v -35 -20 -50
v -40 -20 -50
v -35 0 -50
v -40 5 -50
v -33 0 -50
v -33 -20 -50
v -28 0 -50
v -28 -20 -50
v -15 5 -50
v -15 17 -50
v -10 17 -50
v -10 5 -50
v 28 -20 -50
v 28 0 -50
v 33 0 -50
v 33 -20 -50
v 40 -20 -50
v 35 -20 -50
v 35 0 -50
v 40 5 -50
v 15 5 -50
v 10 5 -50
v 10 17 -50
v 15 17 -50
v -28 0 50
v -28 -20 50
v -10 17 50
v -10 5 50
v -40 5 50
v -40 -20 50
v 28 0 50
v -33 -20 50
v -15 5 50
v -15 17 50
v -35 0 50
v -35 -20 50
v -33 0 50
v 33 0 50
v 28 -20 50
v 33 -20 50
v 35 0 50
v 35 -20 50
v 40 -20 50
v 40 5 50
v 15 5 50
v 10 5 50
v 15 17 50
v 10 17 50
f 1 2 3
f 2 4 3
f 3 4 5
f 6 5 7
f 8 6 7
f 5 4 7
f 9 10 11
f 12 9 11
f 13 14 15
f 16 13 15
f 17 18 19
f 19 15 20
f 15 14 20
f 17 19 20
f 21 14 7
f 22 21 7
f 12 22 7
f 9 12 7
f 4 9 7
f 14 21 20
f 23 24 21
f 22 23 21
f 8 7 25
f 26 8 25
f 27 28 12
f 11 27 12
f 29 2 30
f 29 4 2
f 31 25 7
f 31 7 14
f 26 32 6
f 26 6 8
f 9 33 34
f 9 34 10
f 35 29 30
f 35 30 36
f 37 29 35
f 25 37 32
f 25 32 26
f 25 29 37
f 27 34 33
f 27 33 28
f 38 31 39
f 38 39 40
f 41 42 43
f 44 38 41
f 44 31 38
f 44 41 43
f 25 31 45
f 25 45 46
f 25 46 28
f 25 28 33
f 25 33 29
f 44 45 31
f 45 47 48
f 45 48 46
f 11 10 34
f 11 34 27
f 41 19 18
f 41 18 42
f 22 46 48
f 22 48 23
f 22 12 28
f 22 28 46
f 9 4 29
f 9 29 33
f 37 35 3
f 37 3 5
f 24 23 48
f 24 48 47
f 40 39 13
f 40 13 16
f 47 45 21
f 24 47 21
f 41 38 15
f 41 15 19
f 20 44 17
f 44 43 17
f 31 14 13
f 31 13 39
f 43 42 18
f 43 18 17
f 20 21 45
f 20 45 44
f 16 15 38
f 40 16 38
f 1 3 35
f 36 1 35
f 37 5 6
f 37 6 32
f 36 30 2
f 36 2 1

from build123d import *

# Parameters (mm, degrees)
ESQUISSE1_W        = 80
ESQUISSE1_H        = 100
BOSS_EXTRU_1_DEPTH = 5
ESQUISSE3_W        = 5
ESQUISSE3_H        = 100
BOSS_EXTRU_2_DEPTH = 20
ESQUISSE4_W        = 5
ESQUISSE4_H        = 100
BOSS_EXTRU_3_DEPTH = 12


with BuildPart() as part:
    # Esquisse1 → Boss.-Extru.1 (new body)
    with BuildSketch(Plane(origin=(0, 0, 0), x_dir=(1, 0, 0), z_dir=(0, 1, 0))):
        Rectangle(ESQUISSE1_W, ESQUISSE1_H)
    extrude(amount=BOSS_EXTRU_1_DEPTH)

    # Esquisse3 → Boss.-Extru.2 (add)
    with BuildSketch(Plane.XZ):
        with Locations((-37.5, 0)):
            Rectangle(ESQUISSE3_W, ESQUISSE3_H)
        with Locations((-30.5, 0)):
            Rectangle(ESQUISSE3_W, ESQUISSE3_H)
        with Locations((30.5, 0)):
            Rectangle(ESQUISSE3_W, ESQUISSE3_H)
        with Locations((37.5, 0)):
            Rectangle(ESQUISSE3_W, ESQUISSE3_H)
    extrude(amount=BOSS_EXTRU_2_DEPTH)

    # Esquisse4 → Boss.-Extru.3 (add)
    with BuildSketch(Plane(origin=(0, 5, 0), x_dir=(1, 0, 0), z_dir=(0, 1, 0))):
        with Locations((-12.5, 0)):
            Rectangle(ESQUISSE4_W, ESQUISSE4_H)
        with Locations((12.5, 0)):
            Rectangle(ESQUISSE4_W, ESQUISSE4_H)
    extrude(amount=BOSS_EXTRU_3_DEPTH)


solid = part.part
